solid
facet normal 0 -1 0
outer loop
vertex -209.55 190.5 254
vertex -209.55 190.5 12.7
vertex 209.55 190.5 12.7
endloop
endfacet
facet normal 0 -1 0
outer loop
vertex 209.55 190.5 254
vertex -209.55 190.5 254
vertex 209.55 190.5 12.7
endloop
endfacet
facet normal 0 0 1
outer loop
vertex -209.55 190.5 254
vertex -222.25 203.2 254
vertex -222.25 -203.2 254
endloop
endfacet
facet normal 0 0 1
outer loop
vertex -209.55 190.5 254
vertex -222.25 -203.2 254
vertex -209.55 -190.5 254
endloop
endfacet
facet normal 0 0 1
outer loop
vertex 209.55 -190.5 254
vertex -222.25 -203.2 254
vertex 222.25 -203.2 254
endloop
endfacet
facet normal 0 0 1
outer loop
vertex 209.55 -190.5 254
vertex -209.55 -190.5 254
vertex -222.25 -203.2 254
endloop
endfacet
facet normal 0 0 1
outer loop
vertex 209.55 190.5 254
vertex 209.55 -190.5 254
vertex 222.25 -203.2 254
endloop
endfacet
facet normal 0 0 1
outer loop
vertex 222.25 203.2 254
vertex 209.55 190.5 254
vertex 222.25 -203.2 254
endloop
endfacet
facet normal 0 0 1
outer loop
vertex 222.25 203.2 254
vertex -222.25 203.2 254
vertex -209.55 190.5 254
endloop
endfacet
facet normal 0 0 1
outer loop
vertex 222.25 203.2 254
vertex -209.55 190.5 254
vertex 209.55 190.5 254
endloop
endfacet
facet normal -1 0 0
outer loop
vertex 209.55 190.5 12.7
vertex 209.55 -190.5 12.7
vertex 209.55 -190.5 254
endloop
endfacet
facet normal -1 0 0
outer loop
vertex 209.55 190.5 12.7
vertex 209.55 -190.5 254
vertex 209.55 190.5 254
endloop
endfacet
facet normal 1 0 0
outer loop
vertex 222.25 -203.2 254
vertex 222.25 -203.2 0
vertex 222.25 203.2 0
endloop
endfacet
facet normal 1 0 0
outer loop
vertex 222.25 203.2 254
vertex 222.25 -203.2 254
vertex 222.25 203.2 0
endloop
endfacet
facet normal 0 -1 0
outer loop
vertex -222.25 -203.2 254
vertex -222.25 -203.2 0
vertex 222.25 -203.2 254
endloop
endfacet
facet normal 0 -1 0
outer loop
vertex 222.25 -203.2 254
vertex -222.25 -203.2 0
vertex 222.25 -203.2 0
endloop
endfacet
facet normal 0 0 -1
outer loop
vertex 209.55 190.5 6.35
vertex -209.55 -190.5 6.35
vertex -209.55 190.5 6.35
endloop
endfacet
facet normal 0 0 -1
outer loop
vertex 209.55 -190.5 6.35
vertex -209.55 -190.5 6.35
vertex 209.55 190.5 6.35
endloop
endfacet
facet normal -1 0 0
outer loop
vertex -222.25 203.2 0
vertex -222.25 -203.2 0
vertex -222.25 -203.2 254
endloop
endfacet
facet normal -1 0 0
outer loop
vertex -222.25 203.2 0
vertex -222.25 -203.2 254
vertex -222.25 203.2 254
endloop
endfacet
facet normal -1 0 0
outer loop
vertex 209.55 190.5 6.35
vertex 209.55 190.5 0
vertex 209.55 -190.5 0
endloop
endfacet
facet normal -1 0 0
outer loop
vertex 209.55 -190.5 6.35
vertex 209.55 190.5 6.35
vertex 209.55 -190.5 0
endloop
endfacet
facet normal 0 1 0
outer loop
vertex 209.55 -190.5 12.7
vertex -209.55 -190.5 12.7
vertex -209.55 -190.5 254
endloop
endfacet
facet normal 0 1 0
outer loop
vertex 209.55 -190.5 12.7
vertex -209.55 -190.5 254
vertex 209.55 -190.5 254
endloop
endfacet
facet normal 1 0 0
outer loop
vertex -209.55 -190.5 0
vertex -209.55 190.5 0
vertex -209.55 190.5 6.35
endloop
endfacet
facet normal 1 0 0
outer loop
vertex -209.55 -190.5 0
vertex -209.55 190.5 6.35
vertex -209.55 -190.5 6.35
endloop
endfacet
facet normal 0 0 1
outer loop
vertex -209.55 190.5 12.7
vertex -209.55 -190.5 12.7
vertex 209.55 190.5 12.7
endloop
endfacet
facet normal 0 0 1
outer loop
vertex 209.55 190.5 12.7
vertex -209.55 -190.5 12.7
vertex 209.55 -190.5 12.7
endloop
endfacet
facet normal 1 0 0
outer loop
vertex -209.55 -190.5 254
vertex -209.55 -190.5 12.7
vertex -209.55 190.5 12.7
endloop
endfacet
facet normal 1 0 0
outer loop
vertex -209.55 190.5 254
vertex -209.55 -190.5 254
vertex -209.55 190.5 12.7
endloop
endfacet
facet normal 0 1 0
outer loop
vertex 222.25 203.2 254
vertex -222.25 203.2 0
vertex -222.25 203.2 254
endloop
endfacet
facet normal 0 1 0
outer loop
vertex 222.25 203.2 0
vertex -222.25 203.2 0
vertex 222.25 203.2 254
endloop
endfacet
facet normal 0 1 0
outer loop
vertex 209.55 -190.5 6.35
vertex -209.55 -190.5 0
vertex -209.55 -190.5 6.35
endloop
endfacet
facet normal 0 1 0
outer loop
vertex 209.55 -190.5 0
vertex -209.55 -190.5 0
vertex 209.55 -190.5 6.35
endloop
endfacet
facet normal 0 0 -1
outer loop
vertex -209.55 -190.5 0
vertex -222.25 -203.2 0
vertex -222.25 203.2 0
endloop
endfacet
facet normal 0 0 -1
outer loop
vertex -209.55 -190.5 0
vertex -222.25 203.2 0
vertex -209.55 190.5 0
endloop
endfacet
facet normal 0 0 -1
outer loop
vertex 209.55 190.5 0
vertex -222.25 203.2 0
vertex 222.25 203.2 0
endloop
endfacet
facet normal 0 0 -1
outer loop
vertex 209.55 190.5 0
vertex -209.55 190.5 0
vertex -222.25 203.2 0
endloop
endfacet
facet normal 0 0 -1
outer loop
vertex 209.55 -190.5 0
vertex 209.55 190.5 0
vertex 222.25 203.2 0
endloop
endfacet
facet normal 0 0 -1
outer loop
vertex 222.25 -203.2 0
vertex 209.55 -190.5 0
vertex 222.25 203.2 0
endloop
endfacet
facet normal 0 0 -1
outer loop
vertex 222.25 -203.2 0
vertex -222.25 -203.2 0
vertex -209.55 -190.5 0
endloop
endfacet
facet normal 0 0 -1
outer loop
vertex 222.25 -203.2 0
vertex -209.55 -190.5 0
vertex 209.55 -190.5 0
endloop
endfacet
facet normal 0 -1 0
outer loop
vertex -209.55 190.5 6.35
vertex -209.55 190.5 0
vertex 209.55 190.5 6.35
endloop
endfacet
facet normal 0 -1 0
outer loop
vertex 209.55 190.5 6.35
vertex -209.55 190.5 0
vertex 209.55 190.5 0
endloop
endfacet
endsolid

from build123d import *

# Parameters (mm, degrees)
F0_W     = 444.5
F0_H     = 406.4
F0_W_2   = 419.1
F0_H_2   = 381
F1_DEPTH = 254
F2_W     = 419.1
F2_H     = 381
F3_DEPTH = 12.7
F4_W     = 419.1
F4_H     = 381
F5_DEPTH = 6.35


with BuildPart() as f1:
    # F0 (on Top) → F1 (new body)
    with BuildSketch(Plane.XY):
        Rectangle(F0_W, F0_H)
        Rectangle(F0_W_2, F0_H_2, mode=Mode.SUBTRACT)
    extrude(amount=F1_DEPTH)

    # F2 (on face) → F3 (join)
    with BuildSketch(Plane(origin=(0, 0, 0), x_dir=(1, 0, 0), z_dir=(0, 0, -1))):
        Rectangle(F2_W, F2_H)
    extrude(amount=-F3_DEPTH)

    # F4 (on face) → F5 (cut)
    with BuildSketch(Plane(origin=(0, 0, 0), x_dir=(1, 0, 0), z_dir=(0, 0, -1))):
        Rectangle(F4_W, F4_H)
    extrude(amount=-F5_DEPTH, mode=Mode.SUBTRACT)


solid = f1.part
